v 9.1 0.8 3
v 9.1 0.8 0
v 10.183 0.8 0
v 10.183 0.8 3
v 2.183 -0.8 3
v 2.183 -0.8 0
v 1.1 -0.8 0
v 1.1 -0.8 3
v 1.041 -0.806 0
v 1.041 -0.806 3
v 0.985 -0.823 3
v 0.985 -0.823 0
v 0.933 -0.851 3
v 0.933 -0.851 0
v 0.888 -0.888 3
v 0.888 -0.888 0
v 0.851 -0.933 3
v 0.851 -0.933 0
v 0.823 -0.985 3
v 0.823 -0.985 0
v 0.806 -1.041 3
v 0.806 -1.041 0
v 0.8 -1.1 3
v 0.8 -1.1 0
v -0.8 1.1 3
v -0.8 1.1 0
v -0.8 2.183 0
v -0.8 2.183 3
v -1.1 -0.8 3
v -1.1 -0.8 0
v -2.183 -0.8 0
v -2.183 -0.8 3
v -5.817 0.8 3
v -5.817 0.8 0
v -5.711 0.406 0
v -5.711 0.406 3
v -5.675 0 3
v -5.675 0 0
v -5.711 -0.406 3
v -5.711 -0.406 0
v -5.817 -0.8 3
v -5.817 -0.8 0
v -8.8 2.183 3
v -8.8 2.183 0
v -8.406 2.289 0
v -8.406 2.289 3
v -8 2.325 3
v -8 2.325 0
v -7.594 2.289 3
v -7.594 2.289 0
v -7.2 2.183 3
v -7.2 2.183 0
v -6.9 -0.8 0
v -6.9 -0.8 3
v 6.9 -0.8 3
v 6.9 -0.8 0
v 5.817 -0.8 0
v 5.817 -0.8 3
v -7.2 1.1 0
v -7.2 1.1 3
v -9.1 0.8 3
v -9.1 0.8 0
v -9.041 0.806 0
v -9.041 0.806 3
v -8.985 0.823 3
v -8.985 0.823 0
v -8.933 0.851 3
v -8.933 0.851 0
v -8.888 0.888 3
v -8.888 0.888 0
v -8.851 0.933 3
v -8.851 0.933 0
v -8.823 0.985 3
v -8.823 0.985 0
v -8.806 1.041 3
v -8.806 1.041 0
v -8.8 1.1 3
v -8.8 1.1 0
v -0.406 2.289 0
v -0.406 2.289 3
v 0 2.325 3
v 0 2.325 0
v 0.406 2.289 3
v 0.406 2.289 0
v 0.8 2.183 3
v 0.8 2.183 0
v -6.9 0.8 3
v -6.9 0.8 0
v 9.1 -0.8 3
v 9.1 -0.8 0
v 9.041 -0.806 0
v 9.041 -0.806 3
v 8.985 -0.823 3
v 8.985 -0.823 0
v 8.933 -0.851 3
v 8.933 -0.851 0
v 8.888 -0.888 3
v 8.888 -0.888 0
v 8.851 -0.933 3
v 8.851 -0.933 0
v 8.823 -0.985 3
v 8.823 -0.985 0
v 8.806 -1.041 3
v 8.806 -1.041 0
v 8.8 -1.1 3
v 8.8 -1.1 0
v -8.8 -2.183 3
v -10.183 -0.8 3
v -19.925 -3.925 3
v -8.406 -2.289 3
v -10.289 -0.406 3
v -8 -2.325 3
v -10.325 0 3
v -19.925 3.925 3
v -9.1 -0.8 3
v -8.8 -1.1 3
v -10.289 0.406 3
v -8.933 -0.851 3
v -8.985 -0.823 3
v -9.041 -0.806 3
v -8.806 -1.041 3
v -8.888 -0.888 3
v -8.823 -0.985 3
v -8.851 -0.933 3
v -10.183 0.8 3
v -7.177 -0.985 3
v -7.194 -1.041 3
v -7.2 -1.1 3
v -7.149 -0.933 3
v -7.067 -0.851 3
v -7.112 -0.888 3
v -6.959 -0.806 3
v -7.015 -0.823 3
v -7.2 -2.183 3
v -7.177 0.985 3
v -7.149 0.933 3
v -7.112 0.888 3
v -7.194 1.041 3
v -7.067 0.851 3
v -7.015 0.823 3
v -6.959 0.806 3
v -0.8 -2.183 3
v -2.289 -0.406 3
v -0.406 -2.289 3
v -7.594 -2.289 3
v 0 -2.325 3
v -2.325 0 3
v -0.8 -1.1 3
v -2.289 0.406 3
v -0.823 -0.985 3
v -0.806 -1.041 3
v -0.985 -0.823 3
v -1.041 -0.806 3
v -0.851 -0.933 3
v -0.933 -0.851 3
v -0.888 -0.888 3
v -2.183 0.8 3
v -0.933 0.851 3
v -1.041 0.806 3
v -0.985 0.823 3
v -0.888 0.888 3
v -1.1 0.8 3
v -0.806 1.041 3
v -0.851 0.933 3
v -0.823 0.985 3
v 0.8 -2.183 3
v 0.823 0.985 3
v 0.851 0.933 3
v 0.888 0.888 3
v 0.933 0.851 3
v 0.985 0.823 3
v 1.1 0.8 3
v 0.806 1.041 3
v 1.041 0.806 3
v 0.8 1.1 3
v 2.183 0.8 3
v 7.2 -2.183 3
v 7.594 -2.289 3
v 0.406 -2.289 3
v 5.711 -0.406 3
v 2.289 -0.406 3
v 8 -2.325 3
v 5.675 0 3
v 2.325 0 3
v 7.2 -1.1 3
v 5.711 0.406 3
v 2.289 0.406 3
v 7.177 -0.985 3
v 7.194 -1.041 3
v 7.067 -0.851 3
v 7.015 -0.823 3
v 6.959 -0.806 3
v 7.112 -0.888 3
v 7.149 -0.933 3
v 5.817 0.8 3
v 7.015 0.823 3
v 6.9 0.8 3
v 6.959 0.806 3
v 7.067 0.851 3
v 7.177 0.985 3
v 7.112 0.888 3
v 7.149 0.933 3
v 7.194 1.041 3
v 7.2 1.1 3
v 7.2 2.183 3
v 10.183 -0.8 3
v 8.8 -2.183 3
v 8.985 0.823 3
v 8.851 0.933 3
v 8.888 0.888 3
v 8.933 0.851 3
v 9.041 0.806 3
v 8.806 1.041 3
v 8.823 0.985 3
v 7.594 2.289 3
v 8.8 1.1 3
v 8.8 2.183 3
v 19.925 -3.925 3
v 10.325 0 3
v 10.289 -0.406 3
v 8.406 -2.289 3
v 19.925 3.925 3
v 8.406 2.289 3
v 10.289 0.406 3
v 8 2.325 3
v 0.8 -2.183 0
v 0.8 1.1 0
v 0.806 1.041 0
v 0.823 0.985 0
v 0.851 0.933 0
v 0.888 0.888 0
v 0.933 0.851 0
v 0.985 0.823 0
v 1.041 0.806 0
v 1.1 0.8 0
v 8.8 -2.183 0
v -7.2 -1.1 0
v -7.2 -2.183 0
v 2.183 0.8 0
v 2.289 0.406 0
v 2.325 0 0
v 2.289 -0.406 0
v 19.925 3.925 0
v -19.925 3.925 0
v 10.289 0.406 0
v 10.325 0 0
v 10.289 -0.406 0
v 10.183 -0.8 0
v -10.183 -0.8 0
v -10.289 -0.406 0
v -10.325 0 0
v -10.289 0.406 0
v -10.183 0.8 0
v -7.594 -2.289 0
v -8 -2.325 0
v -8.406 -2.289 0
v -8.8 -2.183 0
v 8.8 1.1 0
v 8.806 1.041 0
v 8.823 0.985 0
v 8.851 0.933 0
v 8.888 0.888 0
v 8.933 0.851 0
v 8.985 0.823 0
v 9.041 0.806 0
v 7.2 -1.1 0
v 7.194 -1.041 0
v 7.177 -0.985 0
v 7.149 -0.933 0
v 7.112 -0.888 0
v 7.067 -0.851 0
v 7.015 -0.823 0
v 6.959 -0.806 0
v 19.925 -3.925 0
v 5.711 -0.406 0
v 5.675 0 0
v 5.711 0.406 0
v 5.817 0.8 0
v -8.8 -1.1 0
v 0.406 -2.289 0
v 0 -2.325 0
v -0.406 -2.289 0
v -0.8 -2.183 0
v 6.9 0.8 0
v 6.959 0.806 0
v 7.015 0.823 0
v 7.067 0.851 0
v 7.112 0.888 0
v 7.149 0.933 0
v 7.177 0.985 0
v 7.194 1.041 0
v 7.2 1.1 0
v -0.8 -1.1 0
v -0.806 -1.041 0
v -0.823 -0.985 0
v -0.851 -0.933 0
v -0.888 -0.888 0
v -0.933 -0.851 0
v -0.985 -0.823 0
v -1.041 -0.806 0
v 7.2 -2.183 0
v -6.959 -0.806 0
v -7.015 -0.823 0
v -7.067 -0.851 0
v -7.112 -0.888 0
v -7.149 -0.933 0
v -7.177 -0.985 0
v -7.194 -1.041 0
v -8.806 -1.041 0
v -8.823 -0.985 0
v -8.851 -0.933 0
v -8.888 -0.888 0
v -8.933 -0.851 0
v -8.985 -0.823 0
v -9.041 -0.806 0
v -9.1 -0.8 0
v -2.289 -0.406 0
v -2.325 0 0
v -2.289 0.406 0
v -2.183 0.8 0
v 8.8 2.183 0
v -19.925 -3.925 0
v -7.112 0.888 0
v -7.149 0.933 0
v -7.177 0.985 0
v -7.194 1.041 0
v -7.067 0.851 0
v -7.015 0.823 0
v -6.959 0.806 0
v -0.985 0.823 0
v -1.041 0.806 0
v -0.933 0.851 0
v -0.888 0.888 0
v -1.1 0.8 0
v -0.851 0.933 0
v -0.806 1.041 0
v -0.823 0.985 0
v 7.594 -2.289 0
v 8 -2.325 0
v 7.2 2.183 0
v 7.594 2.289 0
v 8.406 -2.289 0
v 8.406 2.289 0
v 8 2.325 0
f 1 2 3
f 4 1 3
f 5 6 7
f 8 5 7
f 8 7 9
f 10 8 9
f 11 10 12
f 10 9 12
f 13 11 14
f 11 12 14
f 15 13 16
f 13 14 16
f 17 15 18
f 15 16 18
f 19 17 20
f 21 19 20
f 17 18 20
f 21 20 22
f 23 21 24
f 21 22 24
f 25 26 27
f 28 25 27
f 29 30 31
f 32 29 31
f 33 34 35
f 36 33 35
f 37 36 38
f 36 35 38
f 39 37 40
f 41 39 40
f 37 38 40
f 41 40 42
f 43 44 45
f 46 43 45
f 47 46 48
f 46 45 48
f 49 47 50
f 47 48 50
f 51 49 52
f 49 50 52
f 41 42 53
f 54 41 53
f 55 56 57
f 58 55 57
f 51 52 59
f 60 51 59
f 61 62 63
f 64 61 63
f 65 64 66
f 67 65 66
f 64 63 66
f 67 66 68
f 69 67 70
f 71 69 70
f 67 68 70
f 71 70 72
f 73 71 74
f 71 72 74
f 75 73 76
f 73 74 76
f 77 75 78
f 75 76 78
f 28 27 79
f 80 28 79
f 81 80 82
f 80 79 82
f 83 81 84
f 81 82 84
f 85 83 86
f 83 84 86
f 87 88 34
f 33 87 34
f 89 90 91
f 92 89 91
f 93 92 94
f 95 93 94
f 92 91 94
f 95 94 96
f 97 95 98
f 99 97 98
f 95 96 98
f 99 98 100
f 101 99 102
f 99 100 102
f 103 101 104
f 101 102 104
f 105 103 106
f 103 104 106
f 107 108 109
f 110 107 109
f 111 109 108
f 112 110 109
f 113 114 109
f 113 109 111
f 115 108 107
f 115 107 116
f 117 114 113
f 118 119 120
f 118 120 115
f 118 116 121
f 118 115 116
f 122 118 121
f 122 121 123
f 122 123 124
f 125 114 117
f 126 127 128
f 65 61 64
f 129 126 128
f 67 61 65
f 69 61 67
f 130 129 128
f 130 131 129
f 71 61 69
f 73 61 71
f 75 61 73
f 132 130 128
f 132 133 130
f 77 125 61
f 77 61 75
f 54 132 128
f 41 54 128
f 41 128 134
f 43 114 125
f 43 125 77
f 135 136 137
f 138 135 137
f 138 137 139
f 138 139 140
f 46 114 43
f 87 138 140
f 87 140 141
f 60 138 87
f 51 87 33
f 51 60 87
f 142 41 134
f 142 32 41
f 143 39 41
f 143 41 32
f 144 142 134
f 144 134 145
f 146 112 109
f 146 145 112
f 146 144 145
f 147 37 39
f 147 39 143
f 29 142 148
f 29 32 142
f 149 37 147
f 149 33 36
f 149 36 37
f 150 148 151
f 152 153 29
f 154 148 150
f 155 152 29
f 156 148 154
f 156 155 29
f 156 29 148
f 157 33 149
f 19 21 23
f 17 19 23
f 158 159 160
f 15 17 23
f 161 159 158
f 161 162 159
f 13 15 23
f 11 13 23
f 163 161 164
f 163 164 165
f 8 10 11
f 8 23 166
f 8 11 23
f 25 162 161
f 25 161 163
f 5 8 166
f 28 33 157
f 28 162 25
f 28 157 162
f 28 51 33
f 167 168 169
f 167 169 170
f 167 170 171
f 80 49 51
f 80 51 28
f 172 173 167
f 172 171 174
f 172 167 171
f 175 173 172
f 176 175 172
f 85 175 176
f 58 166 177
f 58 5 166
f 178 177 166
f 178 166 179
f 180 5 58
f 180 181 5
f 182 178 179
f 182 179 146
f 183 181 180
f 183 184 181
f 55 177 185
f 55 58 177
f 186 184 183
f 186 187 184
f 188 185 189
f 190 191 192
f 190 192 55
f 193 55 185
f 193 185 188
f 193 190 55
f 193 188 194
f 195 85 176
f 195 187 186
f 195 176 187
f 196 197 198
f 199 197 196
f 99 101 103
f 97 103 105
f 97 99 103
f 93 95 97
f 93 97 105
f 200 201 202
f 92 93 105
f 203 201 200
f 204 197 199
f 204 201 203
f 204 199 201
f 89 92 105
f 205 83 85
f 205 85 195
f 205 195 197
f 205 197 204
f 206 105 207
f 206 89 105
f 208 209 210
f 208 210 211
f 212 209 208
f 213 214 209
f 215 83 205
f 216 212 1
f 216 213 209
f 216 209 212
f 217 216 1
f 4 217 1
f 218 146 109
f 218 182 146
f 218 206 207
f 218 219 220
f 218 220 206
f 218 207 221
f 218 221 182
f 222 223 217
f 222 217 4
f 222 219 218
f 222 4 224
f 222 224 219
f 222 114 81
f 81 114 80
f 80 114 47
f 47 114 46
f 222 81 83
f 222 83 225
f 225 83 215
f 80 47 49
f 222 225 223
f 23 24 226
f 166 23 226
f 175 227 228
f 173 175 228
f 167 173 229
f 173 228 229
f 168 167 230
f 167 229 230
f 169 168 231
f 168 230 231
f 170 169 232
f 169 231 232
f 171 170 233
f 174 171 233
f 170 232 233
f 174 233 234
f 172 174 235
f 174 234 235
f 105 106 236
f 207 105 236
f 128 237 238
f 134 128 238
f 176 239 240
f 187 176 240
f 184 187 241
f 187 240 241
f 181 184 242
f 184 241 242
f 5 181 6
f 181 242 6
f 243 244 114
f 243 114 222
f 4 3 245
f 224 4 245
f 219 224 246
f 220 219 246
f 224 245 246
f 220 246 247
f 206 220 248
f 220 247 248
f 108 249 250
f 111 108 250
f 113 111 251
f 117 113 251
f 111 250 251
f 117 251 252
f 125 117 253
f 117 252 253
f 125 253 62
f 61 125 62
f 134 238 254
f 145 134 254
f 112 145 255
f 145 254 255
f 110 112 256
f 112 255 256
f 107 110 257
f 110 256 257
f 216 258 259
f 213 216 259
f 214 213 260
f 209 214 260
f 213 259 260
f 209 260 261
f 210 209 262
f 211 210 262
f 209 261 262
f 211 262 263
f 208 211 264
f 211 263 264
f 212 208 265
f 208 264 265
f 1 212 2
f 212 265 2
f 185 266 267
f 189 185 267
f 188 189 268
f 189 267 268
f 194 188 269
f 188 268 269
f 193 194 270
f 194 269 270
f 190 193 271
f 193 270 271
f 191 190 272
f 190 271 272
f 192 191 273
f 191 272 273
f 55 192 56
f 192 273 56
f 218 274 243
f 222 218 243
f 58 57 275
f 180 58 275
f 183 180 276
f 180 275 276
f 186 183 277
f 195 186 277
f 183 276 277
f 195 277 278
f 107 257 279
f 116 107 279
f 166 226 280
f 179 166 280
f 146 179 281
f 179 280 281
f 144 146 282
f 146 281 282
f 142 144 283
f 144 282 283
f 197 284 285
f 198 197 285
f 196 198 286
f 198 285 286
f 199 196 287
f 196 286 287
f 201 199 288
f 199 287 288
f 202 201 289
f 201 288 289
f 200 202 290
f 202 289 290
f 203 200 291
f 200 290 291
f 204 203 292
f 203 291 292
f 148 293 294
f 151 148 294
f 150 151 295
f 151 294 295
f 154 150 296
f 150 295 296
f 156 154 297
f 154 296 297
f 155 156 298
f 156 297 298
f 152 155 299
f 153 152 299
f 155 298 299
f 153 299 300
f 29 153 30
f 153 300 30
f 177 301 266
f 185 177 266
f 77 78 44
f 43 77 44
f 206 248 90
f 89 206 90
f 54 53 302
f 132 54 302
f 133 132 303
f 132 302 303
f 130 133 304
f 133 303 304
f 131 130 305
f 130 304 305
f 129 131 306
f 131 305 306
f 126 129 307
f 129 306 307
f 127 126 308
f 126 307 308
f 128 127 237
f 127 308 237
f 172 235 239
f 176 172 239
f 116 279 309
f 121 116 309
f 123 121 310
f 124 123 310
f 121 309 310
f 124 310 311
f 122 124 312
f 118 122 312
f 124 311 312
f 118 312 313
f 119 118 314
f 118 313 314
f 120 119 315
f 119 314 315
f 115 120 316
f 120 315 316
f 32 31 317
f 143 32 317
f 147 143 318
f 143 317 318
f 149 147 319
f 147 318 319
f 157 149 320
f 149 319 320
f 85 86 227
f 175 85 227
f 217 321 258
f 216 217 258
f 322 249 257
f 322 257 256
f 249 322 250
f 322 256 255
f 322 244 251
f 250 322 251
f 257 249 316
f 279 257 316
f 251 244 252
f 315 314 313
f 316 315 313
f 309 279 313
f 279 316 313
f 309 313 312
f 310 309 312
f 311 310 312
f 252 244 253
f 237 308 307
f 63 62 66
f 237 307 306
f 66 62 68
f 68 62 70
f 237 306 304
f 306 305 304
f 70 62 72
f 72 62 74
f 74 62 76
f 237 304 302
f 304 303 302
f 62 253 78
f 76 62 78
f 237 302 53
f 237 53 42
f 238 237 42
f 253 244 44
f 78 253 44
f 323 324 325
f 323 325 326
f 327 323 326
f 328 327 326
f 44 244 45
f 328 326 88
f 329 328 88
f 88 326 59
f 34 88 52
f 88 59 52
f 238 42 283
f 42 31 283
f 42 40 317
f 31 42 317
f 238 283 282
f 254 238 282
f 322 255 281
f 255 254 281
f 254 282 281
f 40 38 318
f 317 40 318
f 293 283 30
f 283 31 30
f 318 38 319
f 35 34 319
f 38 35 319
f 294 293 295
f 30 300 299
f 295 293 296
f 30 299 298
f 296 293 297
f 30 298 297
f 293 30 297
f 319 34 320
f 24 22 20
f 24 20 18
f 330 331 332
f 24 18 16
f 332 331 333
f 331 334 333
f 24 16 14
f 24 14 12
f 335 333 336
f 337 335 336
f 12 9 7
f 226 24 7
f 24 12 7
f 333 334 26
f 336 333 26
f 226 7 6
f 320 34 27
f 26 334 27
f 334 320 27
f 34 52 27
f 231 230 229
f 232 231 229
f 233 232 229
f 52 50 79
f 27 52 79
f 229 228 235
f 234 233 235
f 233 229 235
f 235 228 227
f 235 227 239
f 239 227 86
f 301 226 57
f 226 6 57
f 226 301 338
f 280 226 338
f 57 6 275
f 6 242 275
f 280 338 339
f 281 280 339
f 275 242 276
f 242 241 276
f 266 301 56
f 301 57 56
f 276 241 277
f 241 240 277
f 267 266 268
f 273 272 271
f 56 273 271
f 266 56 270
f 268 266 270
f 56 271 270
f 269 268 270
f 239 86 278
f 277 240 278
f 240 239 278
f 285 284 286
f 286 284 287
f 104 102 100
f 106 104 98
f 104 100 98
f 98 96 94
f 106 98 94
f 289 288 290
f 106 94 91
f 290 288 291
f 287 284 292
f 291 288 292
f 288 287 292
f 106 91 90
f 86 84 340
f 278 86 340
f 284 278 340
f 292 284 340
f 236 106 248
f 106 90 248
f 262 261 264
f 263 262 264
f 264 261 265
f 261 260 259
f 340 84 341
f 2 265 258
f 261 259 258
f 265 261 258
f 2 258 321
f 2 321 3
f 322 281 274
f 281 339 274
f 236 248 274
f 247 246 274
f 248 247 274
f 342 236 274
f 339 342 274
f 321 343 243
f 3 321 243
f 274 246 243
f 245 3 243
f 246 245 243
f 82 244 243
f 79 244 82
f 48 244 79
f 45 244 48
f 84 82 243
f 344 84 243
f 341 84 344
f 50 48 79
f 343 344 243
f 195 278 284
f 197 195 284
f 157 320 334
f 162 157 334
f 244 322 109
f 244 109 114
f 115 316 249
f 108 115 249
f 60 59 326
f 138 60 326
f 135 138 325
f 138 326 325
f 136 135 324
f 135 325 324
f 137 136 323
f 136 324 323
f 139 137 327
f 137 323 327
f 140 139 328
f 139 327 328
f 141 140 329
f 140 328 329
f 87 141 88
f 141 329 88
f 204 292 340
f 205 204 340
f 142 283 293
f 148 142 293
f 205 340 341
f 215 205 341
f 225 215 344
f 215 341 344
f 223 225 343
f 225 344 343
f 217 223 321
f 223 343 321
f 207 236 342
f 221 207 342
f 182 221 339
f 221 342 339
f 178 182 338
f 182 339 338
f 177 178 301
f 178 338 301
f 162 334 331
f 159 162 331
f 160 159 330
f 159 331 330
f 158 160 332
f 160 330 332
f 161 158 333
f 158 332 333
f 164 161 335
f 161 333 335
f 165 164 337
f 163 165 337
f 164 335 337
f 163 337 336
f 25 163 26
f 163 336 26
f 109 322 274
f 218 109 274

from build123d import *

# Parameters (mm, degrees)
F0_W     = 39.85
F0_H     = 7.85
F1_DEPTH = 3


with BuildPart() as f1:
    # F0 (on Top) → F1 (new body)
    with BuildSketch(Plane.XY):
        Rectangle(F0_W, F0_H)
        with BuildLine():
            ThreePointArc((-16.8, 2.1830311496), (-16, 2.325), (-15.2, 2.1830311496))
            Line((-15.2, 2.1830311496), (-15.2, 1.1))
            ThreePointArc((-15.2, 1.1), (-15.1121320344, 0.8878679656), (-14.9, 0.8))
            Line((-14.9, 0.8), (-13.8169688504, 0.8))
            ThreePointArc((-13.8169688504, 0.8), (-13.675, 0), (-13.8169688504, -0.8))
            Line((-13.8169688504, -0.8), (-14.9, -0.8))
            ThreePointArc((-14.9, -0.8), (-15.1121320344, -0.8878679656), (-15.2, -1.1))
            Line((-15.2, -1.1), (-15.2, -2.1830311496))
            ThreePointArc((-15.2, -2.1830311496), (-16, -2.325), (-16.8, -2.1830311496))
            Line((-16.8, -2.1830311496), (-16.8, -1.1))
            ThreePointArc((-16.8, -1.1), (-16.8878679656, -0.8878679656), (-17.1, -0.8))
            Line((-17.1, -0.8), (-18.1830311496, -0.8))
            ThreePointArc((-18.1830311496, -0.8), (-18.325, 0), (-18.1830311496, 0.8))
            Line((-18.1830311496, 0.8), (-17.1, 0.8))
            ThreePointArc((-17.1, 0.8), (-16.8878679656, 0.8878679656), (-16.8, 1.1))
            Line((-16.8, 1.1), (-16.8, 2.1830311496))
        make_face(mode=Mode.SUBTRACT)
        with BuildLine():
            ThreePointArc((-8.8, 2.1830311496), (-8, 2.325), (-7.2, 2.1830311496))
            Line((-7.2, 2.1830311496), (-7.2, 1.1))
            ThreePointArc((-7.2, 1.1), (-7.1121320344, 0.8878679656), (-6.9, 0.8))
            Line((-6.9, 0.8), (-5.8169688504, 0.8))
            ThreePointArc((-5.8169688504, 0.8), (-5.675, 0), (-5.8169688504, -0.8))
            Line((-5.8169688504, -0.8), (-6.9, -0.8))
            ThreePointArc((-6.9, -0.8), (-7.1121320344, -0.8878679656), (-7.2, -1.1))
            Line((-7.2, -1.1), (-7.2, -2.1830311496))
            ThreePointArc((-7.2, -2.1830311496), (-8, -2.325), (-8.8, -2.1830311496))
            Line((-8.8, -2.1830311496), (-8.8, -1.1))
            ThreePointArc((-8.8, -1.1), (-8.8878679656, -0.8878679656), (-9.1, -0.8))
            Line((-9.1, -0.8), (-10.1830311496, -0.8))
            ThreePointArc((-10.1830311496, -0.8), (-10.325, 0), (-10.1830311496, 0.8))
            Line((-10.1830311496, 0.8), (-9.1, 0.8))
            ThreePointArc((-9.1, 0.8), (-8.8878679656, 0.8878679656), (-8.8, 1.1))
            Line((-8.8, 1.1), (-8.8, 2.1830311496))
        make_face(mode=Mode.SUBTRACT)
        with BuildLine():
            ThreePointArc((-0.8, 2.1830311496), (0, 2.325), (0.8, 2.1830311496))
            Line((0.8, 2.1830311496), (0.8, 1.1))
            ThreePointArc((0.8, 1.1), (0.8878679656, 0.8878679656), (1.1, 0.8))
            Line((1.1, 0.8), (2.1830311496, 0.8))
            ThreePointArc((2.1830311496, 0.8), (2.325, 0), (2.1830311496, -0.8))
            Line((2.1830311496, -0.8), (1.1, -0.8))
            ThreePointArc((1.1, -0.8), (0.8878679656, -0.8878679656), (0.8, -1.1))
            Line((0.8, -1.1), (0.8, -2.1830311496))
            ThreePointArc((0.8, -2.1830311496), (0, -2.325), (-0.8, -2.1830311496))
            Line((-0.8, -2.1830311496), (-0.8, -1.1))
            ThreePointArc((-0.8, -1.1), (-0.8878679656, -0.8878679656), (-1.1, -0.8))
            Line((-1.1, -0.8), (-2.1830311496, -0.8))
            ThreePointArc((-2.1830311496, -0.8), (-2.325, 0), (-2.1830311496, 0.8))
            Line((-2.1830311496, 0.8), (-1.1, 0.8))
            ThreePointArc((-1.1, 0.8), (-0.8878679656, 0.8878679656), (-0.8, 1.1))
            Line((-0.8, 1.1), (-0.8, 2.1830311496))
        make_face(mode=Mode.SUBTRACT)
        with BuildLine():
            ThreePointArc((7.2, 2.1830311496), (8, 2.325), (8.8, 2.1830311496))
            Line((8.8, 2.1830311496), (8.8, 1.1))
            ThreePointArc((8.8, 1.1), (8.8878679656, 0.8878679656), (9.1, 0.8))
            Line((9.1, 0.8), (10.1830311496, 0.8))
            ThreePointArc((10.1830311496, 0.8), (10.325, 0), (10.1830311496, -0.8))
            Line((10.1830311496, -0.8), (9.1, -0.8))
            ThreePointArc((9.1, -0.8), (8.8878679656, -0.8878679656), (8.8, -1.1))
            Line((8.8, -1.1), (8.8, -2.1830311496))
            ThreePointArc((8.8, -2.1830311496), (8, -2.325), (7.2, -2.1830311496))
            Line((7.2, -2.1830311496), (7.2, -1.1))
            ThreePointArc((7.2, -1.1), (7.1121320344, -0.8878679656), (6.9, -0.8))
            Line((6.9, -0.8), (5.8169688504, -0.8))
            ThreePointArc((5.8169688504, -0.8), (5.675, 0), (5.8169688504, 0.8))
            Line((5.8169688504, 0.8), (6.9, 0.8))
            ThreePointArc((6.9, 0.8), (7.1121320344, 0.8878679656), (7.2, 1.1))
            Line((7.2, 1.1), (7.2, 2.1830311496))
        make_face(mode=Mode.SUBTRACT)
        with BuildLine():
            ThreePointArc((15.2, 2.1830311496), (16, 2.325), (16.8, 2.1830311496))
            Line((16.8, 2.1830311496), (16.8, 1.1))
            ThreePointArc((16.8, 1.1), (16.8878679656, 0.8878679656), (17.1, 0.8))
            Line((17.1, 0.8), (18.1830311496, 0.8))
            ThreePointArc((18.1830311496, 0.8), (18.325, 0), (18.1830311496, -0.8))
            Line((18.1830311496, -0.8), (17.1, -0.8))
            ThreePointArc((17.1, -0.8), (16.8878679656, -0.8878679656), (16.8, -1.1))
            Line((16.8, -1.1), (16.8, -2.1830311496))
            ThreePointArc((16.8, -2.1830311496), (16, -2.325), (15.2, -2.1830311496))
            Line((15.2, -2.1830311496), (15.2, -1.1))
            ThreePointArc((15.2, -1.1), (15.1121320344, -0.8878679656), (14.9, -0.8))
            Line((14.9, -0.8), (13.8169688504, -0.8))
            ThreePointArc((13.8169688504, -0.8), (13.675, 0), (13.8169688504, 0.8))
            Line((13.8169688504, 0.8), (14.9, 0.8))
            ThreePointArc((14.9, 0.8), (15.1121320344, 0.8878679656), (15.2, 1.1))
            Line((15.2, 1.1), (15.2, 2.1830311496))
        make_face(mode=Mode.SUBTRACT)
        with BuildLine():
            Line((-15.2, 1.1), (-15.2, 2.1830311496))
            ThreePointArc((-15.2, 2.1830311496), (-16, 2.325), (-16.8, 2.1830311496))
            Line((-16.8, 2.1830311496), (-16.8, 1.1))
            ThreePointArc((-16.8, 1.1), (-16.8878679656, 0.8878679656), (-17.1, 0.8))
            Line((-17.1, 0.8), (-18.1830311496, 0.8))
            ThreePointArc((-18.1830311496, 0.8), (-18.325, 0), (-18.1830311496, -0.8))
            Line((-18.1830311496, -0.8), (-17.1, -0.8))
            ThreePointArc((-17.1, -0.8), (-16.8878679656, -0.8878679656), (-16.8, -1.1))
            Line((-16.8, -1.1), (-16.8, -2.1830311496))
            ThreePointArc((-16.8, -2.1830311496), (-16, -2.325), (-15.2, -2.1830311496))
            Line((-15.2, -2.1830311496), (-15.2, -1.1))
            ThreePointArc((-15.2, -1.1), (-15.1121320344, -0.8878679656), (-14.9, -0.8))
            Line((-14.9, -0.8), (-13.8169688504, -0.8))
            ThreePointArc((-13.8169688504, -0.8), (-13.675, 0), (-13.8169688504, 0.8))
            Line((-13.8169688504, 0.8), (-14.9, 0.8))
            ThreePointArc((-14.9, 0.8), (-15.1121320344, 0.8878679656), (-15.2, 1.1))
        make_face()
        with BuildLine():
            Line((16.8, 1.1), (16.8, 2.1830311496))
            ThreePointArc((16.8, 2.1830311496), (16, 2.325), (15.2, 2.1830311496))
            Line((15.2, 2.1830311496), (15.2, 1.1))
            ThreePointArc((15.2, 1.1), (15.1121320344, 0.8878679656), (14.9, 0.8))
            Line((14.9, 0.8), (13.8169688504, 0.8))
            ThreePointArc((13.8169688504, 0.8), (13.675, 0), (13.8169688504, -0.8))
            Line((13.8169688504, -0.8), (14.9, -0.8))
            ThreePointArc((14.9, -0.8), (15.1121320344, -0.8878679656), (15.2, -1.1))
            Line((15.2, -1.1), (15.2, -2.1830311496))
            ThreePointArc((15.2, -2.1830311496), (16, -2.325), (16.8, -2.1830311496))
            Line((16.8, -2.1830311496), (16.8, -1.1))
            ThreePointArc((16.8, -1.1), (16.8878679656, -0.8878679656), (17.1, -0.8))
            Line((17.1, -0.8), (18.1830311496, -0.8))
            ThreePointArc((18.1830311496, -0.8), (18.325, 0), (18.1830311496, 0.8))
            Line((18.1830311496, 0.8), (17.1, 0.8))
            ThreePointArc((17.1, 0.8), (16.8878679656, 0.8878679656), (16.8, 1.1))
        make_face()
    extrude(amount=F1_DEPTH)


solid = f1.part
